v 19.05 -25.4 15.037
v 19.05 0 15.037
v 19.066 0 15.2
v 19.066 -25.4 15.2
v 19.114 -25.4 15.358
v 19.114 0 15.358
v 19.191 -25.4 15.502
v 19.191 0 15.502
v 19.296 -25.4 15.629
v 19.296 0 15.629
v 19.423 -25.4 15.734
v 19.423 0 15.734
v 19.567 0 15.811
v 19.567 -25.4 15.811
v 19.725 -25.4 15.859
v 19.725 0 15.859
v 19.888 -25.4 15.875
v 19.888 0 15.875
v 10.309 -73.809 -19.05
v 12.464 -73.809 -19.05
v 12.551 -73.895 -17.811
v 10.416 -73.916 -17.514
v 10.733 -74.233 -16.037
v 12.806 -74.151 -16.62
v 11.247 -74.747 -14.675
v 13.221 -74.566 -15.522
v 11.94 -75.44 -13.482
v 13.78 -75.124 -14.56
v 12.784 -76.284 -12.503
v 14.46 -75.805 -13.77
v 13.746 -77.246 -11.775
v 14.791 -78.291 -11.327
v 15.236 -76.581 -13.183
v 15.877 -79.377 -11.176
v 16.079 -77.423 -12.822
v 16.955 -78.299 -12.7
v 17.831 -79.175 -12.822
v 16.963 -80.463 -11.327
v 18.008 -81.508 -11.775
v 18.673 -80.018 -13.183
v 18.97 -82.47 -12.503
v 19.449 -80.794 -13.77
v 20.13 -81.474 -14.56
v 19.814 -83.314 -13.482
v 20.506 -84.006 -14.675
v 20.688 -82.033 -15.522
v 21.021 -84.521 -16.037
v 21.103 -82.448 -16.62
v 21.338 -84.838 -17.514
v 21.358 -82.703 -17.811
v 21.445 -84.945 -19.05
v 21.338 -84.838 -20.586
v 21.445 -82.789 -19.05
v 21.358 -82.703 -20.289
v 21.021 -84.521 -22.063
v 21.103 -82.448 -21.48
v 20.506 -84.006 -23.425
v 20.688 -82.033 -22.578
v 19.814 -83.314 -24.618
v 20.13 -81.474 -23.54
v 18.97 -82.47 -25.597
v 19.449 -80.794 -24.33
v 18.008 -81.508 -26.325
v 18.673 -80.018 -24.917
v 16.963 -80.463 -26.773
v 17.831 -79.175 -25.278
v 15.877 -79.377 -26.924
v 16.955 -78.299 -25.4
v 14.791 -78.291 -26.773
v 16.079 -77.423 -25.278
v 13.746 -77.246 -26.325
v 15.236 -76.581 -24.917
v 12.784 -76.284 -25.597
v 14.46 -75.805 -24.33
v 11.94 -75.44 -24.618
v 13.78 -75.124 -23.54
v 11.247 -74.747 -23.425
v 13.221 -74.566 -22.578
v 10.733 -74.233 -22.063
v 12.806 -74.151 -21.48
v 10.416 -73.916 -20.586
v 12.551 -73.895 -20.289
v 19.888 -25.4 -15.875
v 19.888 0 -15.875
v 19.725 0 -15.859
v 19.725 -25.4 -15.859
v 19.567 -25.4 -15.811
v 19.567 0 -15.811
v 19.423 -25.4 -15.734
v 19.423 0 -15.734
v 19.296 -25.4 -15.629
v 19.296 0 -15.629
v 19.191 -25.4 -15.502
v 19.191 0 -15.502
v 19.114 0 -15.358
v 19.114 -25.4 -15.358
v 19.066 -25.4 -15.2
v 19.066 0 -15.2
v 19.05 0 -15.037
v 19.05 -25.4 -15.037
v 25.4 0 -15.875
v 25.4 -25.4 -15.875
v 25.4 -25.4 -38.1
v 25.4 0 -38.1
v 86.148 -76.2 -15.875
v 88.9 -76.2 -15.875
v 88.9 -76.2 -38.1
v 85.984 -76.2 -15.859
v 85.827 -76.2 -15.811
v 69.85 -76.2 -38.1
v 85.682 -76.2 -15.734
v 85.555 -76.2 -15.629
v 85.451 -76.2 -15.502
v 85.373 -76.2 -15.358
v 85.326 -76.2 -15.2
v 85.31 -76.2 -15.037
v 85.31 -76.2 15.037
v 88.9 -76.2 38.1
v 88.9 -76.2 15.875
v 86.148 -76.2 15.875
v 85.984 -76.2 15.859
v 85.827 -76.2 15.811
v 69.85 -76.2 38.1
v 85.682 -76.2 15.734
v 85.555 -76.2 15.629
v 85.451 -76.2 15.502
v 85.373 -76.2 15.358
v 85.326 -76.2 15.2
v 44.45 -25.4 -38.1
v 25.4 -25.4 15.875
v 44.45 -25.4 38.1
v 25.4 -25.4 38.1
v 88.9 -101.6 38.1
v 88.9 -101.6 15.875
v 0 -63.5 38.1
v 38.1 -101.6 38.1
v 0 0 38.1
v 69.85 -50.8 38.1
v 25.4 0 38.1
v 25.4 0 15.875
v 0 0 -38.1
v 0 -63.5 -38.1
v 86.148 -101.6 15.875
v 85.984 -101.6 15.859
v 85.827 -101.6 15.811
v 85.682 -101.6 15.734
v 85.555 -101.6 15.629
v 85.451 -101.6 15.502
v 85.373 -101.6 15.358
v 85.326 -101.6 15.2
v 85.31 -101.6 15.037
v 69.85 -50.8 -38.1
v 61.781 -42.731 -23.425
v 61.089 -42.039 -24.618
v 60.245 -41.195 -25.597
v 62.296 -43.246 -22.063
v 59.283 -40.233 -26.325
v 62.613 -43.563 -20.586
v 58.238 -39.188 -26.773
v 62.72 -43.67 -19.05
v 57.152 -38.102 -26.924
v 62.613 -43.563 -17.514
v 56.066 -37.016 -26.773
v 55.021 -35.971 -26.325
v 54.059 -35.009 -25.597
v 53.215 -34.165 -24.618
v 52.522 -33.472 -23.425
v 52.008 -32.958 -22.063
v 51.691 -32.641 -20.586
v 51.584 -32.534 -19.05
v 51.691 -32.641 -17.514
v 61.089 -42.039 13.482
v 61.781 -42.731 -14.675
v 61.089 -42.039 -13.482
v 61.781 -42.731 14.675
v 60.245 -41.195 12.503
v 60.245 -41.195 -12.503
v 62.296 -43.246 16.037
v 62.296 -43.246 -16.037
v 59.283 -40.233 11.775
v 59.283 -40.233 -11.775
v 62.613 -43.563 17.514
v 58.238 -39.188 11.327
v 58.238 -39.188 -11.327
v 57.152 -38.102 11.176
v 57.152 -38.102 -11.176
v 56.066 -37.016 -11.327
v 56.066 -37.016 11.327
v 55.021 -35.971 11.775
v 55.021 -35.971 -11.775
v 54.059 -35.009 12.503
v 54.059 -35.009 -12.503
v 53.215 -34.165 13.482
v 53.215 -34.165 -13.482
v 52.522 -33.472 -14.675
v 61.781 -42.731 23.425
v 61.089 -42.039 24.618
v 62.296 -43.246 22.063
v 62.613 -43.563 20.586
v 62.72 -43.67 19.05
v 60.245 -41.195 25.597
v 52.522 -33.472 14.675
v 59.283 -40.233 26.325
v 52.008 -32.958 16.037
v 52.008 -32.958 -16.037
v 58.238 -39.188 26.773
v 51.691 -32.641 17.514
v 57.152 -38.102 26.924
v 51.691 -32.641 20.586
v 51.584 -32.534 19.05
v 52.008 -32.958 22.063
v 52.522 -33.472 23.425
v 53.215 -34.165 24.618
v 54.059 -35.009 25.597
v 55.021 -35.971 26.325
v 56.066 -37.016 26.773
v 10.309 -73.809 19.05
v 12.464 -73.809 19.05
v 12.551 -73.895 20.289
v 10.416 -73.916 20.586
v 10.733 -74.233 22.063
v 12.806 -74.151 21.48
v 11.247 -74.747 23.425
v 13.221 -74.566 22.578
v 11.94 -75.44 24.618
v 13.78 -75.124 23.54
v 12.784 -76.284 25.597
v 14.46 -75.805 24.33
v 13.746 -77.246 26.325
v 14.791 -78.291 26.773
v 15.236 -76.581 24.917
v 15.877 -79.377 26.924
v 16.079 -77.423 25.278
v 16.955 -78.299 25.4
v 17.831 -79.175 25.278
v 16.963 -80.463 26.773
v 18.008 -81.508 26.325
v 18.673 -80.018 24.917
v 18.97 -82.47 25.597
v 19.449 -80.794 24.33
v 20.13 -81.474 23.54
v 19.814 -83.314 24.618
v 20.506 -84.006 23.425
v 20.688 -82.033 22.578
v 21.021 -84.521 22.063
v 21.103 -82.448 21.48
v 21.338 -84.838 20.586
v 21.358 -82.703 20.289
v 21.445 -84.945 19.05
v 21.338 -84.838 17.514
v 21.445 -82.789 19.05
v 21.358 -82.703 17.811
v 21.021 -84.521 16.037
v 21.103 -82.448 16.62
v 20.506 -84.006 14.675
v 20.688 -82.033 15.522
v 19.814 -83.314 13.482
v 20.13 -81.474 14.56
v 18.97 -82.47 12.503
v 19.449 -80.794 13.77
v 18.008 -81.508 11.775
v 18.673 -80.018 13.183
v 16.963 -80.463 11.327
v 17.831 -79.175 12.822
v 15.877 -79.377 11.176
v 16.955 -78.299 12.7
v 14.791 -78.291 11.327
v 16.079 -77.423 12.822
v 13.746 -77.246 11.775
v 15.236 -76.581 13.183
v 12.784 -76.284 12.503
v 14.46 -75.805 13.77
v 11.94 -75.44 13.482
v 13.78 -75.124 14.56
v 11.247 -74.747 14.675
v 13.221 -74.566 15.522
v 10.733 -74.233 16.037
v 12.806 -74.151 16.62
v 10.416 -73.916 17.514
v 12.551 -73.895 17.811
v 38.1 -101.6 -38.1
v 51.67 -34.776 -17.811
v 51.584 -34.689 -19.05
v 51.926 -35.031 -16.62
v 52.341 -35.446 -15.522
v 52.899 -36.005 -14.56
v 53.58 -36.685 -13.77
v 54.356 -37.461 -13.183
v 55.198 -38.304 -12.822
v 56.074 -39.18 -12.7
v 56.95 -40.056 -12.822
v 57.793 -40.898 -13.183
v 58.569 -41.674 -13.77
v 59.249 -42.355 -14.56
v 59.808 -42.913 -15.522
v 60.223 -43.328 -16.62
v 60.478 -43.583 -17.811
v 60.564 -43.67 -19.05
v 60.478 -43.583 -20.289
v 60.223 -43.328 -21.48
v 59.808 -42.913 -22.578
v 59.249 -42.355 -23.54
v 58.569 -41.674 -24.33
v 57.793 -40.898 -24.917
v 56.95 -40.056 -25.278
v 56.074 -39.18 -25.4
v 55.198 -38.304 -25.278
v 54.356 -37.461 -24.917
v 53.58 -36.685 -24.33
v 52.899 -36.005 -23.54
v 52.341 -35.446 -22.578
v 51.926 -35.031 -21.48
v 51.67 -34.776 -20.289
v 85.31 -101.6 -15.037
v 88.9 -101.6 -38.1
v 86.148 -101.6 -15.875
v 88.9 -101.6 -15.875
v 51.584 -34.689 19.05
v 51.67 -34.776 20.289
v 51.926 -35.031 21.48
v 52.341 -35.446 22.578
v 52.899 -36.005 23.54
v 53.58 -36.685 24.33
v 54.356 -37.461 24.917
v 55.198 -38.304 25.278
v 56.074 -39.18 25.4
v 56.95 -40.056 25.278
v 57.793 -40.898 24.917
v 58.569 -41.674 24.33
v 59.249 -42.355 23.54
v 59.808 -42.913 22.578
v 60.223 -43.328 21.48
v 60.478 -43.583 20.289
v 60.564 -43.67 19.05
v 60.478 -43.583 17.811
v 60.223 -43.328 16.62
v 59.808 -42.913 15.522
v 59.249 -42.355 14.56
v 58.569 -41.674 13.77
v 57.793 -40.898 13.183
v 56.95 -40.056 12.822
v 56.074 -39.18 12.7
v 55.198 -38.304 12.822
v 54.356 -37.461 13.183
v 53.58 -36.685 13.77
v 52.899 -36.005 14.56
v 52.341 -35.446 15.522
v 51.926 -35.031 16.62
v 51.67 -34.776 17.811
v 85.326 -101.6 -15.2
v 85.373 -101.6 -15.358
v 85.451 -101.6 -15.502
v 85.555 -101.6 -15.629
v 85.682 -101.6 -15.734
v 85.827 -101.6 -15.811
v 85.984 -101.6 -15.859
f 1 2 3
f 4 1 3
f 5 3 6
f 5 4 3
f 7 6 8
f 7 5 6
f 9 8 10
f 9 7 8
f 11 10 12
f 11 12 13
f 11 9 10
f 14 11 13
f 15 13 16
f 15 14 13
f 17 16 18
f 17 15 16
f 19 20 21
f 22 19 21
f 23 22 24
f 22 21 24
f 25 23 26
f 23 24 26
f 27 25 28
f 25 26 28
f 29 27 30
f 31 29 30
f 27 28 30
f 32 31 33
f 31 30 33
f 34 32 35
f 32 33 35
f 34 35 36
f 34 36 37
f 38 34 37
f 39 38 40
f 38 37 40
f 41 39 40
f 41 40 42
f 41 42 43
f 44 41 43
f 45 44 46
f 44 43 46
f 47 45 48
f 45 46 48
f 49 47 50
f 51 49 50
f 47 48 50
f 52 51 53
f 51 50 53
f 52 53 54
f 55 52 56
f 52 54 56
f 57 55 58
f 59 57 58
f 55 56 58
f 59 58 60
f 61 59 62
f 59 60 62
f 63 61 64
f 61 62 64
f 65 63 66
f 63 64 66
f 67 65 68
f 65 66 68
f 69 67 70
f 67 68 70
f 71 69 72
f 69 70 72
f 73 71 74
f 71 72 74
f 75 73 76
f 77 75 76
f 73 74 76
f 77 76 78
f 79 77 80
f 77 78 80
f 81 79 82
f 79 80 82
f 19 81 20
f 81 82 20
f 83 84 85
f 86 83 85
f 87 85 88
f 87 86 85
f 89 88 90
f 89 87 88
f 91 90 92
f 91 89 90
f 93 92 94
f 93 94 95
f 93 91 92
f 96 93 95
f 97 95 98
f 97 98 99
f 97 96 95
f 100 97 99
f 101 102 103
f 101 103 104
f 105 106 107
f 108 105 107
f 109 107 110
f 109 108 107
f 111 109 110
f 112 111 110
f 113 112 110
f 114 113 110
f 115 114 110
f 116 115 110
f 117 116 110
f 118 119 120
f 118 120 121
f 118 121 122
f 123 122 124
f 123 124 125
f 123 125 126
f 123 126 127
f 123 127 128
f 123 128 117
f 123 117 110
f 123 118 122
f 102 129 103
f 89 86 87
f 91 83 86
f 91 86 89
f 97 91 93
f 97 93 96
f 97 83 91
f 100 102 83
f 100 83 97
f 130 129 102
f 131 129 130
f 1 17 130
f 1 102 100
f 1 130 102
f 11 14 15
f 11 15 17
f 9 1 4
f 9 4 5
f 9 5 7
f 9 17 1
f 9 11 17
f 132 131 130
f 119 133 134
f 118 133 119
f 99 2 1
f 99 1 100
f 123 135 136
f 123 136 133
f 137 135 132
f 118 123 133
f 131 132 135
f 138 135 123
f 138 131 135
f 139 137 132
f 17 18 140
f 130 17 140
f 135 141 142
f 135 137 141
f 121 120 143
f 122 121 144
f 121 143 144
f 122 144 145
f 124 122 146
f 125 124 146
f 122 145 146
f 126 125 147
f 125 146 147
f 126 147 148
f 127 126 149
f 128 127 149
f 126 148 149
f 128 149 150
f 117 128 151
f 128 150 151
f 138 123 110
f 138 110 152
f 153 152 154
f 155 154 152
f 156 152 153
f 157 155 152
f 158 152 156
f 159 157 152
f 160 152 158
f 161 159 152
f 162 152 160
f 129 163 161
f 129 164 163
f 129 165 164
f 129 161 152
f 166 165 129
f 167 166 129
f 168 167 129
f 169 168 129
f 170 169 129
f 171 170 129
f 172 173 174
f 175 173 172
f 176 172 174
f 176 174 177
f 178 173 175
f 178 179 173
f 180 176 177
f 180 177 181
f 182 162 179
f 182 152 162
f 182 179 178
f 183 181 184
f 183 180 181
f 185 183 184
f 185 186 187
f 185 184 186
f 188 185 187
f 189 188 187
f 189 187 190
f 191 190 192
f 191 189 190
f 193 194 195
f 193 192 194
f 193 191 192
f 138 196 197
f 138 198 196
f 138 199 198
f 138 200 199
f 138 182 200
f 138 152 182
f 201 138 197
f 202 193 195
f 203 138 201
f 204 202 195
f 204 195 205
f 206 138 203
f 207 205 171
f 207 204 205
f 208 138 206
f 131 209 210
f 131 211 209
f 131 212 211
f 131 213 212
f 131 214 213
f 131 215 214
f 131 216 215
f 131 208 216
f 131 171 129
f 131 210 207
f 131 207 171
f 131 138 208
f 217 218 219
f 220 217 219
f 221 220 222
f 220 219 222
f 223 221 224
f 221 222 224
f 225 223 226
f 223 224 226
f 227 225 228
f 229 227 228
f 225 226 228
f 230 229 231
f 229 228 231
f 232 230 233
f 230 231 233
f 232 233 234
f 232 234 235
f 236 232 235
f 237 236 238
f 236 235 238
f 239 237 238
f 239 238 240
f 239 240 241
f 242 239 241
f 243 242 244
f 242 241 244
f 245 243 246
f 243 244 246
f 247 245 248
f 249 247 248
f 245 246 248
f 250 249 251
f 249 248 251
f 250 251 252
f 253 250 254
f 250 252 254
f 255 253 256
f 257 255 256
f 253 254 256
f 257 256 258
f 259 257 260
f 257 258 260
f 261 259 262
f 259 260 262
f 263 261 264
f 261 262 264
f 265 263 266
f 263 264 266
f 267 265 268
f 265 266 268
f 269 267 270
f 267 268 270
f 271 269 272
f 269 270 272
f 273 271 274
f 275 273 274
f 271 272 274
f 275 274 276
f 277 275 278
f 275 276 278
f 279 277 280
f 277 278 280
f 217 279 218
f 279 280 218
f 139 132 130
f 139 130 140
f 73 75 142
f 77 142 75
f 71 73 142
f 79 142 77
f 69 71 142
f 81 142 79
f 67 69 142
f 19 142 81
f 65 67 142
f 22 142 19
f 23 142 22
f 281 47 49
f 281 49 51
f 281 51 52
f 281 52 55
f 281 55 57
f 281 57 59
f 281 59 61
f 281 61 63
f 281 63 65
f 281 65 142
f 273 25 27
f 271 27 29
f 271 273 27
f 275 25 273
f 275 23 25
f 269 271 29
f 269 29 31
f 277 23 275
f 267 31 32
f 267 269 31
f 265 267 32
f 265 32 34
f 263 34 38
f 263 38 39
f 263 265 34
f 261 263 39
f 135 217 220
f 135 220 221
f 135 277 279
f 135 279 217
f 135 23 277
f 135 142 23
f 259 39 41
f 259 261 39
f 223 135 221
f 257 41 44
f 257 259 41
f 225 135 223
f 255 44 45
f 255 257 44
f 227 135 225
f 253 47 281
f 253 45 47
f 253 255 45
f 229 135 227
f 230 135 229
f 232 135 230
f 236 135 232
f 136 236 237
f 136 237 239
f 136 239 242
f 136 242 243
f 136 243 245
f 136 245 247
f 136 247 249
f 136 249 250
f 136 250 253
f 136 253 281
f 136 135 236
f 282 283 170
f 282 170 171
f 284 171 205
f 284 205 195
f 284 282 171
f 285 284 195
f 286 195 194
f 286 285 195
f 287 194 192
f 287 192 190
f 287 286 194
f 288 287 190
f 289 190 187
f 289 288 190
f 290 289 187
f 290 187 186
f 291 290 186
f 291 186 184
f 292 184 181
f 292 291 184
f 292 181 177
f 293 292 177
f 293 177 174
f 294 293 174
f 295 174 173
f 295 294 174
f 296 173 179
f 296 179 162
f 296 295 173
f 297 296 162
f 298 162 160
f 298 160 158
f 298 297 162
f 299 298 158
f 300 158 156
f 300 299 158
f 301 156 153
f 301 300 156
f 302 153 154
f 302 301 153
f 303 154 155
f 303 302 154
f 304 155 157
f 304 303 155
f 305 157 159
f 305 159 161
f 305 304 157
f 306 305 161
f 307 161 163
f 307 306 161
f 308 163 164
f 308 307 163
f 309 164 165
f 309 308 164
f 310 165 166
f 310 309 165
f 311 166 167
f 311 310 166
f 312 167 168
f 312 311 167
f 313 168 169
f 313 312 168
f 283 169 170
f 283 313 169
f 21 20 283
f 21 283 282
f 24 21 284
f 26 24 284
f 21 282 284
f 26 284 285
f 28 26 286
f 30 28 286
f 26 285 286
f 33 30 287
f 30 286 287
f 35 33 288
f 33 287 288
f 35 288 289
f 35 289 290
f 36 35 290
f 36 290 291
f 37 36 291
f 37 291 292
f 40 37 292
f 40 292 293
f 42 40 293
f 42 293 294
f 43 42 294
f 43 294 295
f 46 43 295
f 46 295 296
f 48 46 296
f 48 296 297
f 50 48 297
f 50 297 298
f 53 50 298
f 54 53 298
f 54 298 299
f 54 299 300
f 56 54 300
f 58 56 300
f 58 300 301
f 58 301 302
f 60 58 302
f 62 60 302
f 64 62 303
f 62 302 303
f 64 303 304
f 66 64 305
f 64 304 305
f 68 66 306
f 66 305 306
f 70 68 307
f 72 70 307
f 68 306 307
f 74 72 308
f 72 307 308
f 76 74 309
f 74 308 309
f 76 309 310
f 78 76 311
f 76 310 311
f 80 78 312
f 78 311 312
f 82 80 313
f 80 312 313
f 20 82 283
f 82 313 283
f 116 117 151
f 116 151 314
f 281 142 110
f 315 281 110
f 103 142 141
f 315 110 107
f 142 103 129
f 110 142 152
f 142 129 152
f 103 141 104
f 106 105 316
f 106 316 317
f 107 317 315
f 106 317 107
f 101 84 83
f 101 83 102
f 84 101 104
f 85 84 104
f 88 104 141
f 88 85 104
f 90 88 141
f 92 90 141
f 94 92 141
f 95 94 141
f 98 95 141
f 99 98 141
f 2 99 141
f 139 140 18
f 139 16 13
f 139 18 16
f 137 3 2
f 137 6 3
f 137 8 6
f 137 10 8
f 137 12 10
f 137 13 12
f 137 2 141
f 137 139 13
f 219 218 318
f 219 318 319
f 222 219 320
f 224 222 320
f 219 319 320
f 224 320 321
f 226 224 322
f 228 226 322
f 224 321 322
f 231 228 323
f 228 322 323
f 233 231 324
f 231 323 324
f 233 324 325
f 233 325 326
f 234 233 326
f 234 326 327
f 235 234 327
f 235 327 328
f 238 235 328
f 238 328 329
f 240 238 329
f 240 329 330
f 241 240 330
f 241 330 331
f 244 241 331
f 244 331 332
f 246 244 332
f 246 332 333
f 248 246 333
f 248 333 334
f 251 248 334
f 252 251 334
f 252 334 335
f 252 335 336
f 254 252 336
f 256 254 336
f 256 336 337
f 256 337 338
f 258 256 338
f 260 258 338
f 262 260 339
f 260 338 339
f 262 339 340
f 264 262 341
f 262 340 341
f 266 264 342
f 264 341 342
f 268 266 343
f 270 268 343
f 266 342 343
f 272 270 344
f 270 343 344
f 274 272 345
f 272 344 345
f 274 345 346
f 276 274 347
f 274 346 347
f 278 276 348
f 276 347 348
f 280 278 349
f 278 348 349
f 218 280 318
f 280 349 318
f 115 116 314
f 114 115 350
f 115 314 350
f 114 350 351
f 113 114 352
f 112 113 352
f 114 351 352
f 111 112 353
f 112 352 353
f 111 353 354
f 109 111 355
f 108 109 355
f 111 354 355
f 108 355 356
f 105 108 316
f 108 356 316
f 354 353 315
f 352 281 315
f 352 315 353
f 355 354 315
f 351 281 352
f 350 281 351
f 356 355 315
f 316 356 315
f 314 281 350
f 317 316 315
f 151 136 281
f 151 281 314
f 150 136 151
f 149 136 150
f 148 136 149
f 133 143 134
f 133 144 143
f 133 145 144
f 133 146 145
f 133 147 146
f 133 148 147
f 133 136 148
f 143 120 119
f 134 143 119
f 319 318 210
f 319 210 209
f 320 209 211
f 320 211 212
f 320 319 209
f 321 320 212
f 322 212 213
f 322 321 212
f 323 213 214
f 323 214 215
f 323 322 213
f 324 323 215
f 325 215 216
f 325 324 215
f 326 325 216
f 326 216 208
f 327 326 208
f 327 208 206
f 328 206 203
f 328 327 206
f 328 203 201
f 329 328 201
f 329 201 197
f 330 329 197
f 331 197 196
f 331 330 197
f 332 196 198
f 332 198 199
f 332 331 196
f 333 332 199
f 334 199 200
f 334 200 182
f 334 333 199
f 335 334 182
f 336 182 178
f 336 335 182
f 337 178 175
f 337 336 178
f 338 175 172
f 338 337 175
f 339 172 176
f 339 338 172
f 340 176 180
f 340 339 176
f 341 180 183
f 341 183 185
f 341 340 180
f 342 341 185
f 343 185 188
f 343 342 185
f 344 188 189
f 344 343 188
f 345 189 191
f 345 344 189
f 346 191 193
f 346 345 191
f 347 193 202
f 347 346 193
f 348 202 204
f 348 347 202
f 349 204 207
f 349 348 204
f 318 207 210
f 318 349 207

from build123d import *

# Parameters (mm, degrees)
BOSS_EXTRUDE1_DEPTH = 38.1
SKETCH2_R           = 6.35
CUT_EXTRUDE1_DEPTH  = 142.777171117
CHAMFER1_SIZE       = 1.524
SKETCH3_W           = 6.35
SKETCH3_H           = 31.75
CUT_EXTRUDE2_DEPTH  = 25.4
SKETCH4_W           = 3.590345221
SKETCH4_H           = 31.75
CUT_EXTRUDE3_DEPTH  = 124.131068378
FILLET1_R           = 0.8382


with BuildPart() as part:
    # Sketch1 → Boss-Extrude1 (new, symmetric)
    with BuildSketch(Plane.XY):
        Polygon((0, 0), (0, -63.5), (38.1, -101.6), (88.9, -101.6), (88.9, -76.2), (69.85, -76.2), (69.85, -50.8), (44.45, -25.4), (25.4, -25.4), (25.4, 0), align=None)
    extrude(amount=BOSS_EXTRUDE1_DEPTH, both=True)

    # Sketch2 → Cut-Extrude1 (cut, through all)
    with BuildSketch(Plane(origin=(9.525, 9.525, 0), x_dir=(0, 0, -1), z_dir=(0.7071067811865488, 0.7071067811865464, 0))):
        with Locations(Location((-19.05, -67.35463315, 0), (0, 0, 90))):
            Circle(SKETCH2_R)
        with Locations(Location((19.05, -67.35463315, 0), (0, 0, 90))):
            Circle(SKETCH2_R)
    extrude(amount=-CUT_EXTRUDE1_DEPTH, mode=Mode.SUBTRACT)

    # Chamfer1
    chamfer1_edges = [part.edges().sort_by_distance(p)[0] for p in [
        (20.367045905, -83.867045905, 19.05),
        (61.642045905, -42.592045905, 19.05),
        (20.367045905, -83.867045905, -19.05),
        (61.642045905, -42.592045905, -19.05),
    ]]
    chamfer(chamfer1_edges, length=CHAMFER1_SIZE)

    # Sketch3 → Cut-Extrude2 (cut)
    with BuildSketch(Plane(origin=(0, 0, 0), x_dir=(1, 0, 0), z_dir=(0, 1, 0))):
        with Locations((22.225, 0)):
            Rectangle(SKETCH3_W, SKETCH3_H)
    extrude(amount=-CUT_EXTRUDE2_DEPTH, mode=Mode.SUBTRACT)

    # Sketch4 → Cut-Extrude3 (cut, through all)
    with BuildSketch(Plane(origin=(0, -76.2, 0), x_dir=(1, 0, 0), z_dir=(0, 1, 0))):
        with Locations((87.10482739, 0)):
            Rectangle(SKETCH4_W, SKETCH4_H)
    extrude(amount=-CUT_EXTRUDE3_DEPTH, mode=Mode.SUBTRACT)

    # Fillet1
    fillet1_edges = [part.edges().sort_by_distance(p)[0] for p in [
        (19.05, -12.7, -15.875),
        (19.05, -12.7, 15.875),
        (85.309654779, -88.9, 15.875),
        (85.309654779, -88.9, -15.875),
    ]]
    fillet(fillet1_edges, radius=FILLET1_R)


solid = part.part
